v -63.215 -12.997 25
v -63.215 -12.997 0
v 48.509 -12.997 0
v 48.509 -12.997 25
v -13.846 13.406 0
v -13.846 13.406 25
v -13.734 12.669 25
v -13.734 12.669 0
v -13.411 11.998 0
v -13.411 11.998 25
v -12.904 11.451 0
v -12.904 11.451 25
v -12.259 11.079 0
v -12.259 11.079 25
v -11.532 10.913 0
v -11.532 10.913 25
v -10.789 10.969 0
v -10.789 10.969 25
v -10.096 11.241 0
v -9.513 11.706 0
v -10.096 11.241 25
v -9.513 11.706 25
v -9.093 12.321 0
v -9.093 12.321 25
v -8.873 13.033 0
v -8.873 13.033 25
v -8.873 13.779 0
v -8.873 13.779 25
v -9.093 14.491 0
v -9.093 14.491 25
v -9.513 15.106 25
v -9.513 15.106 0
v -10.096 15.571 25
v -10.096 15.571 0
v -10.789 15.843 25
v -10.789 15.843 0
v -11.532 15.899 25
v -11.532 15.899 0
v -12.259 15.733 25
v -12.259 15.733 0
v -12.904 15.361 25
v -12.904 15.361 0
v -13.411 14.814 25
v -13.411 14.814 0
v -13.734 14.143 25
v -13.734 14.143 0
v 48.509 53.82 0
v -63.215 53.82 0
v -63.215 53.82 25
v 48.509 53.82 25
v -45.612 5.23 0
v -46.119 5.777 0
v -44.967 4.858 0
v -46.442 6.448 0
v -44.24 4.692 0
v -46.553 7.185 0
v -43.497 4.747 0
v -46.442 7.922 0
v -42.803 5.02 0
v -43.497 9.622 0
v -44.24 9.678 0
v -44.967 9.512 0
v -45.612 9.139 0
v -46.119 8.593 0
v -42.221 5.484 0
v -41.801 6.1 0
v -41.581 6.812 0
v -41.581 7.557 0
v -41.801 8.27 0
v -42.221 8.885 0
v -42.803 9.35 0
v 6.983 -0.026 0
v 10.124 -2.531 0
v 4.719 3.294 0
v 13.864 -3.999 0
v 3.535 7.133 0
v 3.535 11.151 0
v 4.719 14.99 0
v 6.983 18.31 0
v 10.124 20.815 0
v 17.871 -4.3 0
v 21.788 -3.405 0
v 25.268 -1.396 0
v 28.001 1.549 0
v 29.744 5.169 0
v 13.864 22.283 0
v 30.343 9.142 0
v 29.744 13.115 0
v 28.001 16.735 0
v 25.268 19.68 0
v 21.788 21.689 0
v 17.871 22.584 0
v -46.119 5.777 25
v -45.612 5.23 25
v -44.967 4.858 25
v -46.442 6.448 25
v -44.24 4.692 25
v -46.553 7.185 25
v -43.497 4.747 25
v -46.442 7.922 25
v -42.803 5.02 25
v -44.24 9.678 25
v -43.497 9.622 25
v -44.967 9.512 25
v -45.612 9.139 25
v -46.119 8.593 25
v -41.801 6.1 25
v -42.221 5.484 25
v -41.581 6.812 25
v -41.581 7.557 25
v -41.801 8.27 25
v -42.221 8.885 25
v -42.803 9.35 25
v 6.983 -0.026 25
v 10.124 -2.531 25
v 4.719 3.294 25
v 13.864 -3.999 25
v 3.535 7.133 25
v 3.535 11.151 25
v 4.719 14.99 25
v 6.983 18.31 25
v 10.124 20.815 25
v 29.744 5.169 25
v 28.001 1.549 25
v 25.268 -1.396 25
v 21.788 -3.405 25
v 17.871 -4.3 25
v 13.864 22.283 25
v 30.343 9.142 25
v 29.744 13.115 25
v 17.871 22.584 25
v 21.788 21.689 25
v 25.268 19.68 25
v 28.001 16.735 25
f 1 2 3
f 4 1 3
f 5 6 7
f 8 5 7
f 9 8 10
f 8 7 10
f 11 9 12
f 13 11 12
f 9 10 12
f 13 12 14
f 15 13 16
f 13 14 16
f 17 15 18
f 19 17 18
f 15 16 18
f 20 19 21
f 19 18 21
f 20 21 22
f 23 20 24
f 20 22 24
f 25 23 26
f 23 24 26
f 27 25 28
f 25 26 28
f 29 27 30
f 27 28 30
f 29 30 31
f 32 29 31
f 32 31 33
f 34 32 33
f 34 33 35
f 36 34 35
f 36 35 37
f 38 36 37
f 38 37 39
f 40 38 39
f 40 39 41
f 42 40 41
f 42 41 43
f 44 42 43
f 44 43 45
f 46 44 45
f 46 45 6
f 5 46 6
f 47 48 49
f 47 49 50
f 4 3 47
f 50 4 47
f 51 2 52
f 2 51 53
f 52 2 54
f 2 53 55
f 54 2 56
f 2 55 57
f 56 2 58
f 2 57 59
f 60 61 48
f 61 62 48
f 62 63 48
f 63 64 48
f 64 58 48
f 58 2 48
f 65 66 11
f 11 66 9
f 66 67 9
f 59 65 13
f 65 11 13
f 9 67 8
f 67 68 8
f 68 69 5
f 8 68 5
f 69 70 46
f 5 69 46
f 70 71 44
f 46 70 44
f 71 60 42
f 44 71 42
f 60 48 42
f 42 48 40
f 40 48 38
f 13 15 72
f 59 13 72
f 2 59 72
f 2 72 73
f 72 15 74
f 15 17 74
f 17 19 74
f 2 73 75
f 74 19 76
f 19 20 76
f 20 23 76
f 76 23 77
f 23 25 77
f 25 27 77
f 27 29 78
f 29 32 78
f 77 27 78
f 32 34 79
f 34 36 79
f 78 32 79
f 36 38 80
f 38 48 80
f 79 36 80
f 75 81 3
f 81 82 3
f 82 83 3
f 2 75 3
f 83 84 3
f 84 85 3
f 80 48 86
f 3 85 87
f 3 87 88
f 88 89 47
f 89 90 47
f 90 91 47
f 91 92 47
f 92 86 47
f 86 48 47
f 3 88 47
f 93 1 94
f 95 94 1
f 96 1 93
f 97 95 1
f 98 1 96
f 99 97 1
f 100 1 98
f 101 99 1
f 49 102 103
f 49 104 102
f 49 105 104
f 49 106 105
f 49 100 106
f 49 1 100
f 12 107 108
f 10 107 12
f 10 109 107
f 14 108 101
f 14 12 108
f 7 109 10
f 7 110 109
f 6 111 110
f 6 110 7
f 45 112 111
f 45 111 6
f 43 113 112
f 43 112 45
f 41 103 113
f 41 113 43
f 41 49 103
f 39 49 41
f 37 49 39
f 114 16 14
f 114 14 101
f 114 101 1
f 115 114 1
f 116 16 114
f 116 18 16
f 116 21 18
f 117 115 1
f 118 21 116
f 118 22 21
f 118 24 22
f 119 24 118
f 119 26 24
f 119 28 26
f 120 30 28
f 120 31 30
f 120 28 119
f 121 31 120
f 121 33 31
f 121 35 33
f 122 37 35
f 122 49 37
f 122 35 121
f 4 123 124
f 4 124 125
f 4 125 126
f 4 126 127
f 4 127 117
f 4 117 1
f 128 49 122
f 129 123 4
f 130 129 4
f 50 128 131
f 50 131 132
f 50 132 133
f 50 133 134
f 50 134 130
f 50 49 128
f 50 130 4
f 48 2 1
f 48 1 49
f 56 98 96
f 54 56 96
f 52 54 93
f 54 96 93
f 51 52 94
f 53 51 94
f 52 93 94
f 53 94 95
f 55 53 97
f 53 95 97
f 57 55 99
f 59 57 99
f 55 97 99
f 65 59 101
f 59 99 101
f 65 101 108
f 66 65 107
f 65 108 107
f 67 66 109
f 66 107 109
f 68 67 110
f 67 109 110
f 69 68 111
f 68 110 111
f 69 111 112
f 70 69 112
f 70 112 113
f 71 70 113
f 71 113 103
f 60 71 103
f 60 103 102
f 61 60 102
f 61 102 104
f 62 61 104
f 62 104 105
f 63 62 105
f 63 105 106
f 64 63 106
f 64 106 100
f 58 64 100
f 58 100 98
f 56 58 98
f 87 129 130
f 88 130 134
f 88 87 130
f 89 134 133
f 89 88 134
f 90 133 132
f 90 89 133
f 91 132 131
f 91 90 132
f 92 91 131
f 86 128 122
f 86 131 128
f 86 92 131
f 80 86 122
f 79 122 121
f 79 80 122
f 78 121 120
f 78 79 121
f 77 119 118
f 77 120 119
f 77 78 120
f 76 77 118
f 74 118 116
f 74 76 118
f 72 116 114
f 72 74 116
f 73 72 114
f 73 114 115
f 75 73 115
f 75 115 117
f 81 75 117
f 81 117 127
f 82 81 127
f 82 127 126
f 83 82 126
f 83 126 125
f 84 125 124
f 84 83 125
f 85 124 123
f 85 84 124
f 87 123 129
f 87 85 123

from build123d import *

# Parameters (mm, degrees)
F0_W     = 111.7238141596
F0_H     = 66.8160738423
F1_DEPTH = 25
F3_D     = 5
F5_D     = 5
F6_R     = 13.4792277867
F7_DEPTH = 25.001


with BuildPart() as f1:
    # F0 (on Top) → F1 (new body)
    with BuildSketch(Plane.XY):
        with Locations((-7.3526781052, 20.4115337692)):
            Rectangle(F0_W, F0_H)
    extrude(amount=F1_DEPTH)

    # F3 (through all)
    with Locations(Plane(origin=(0, 0, 0), x_dir=(1, 0, 0), z_dir=(0, 0, -1))):
        with Locations((-44.0534129739, -7.1848076768)):
            Hole(F3_D / 2)

    # F5 (through all)
    with Locations(Plane(origin=(0, 0, 0), x_dir=(1, 0, 0), z_dir=(0, 0, -1))):
        with Locations((-11.3455168903, -13.4060289711)):
            Hole(F5_D / 2)

    # F6 (on Top) → F7 (cut, through all)
    with BuildSketch(Plane.XY):
        with Locations((16.8637931347, 9.1420030221)):
            Circle(F6_R)
    extrude(amount=F7_DEPTH, mode=Mode.SUBTRACT)


solid = f1.part
